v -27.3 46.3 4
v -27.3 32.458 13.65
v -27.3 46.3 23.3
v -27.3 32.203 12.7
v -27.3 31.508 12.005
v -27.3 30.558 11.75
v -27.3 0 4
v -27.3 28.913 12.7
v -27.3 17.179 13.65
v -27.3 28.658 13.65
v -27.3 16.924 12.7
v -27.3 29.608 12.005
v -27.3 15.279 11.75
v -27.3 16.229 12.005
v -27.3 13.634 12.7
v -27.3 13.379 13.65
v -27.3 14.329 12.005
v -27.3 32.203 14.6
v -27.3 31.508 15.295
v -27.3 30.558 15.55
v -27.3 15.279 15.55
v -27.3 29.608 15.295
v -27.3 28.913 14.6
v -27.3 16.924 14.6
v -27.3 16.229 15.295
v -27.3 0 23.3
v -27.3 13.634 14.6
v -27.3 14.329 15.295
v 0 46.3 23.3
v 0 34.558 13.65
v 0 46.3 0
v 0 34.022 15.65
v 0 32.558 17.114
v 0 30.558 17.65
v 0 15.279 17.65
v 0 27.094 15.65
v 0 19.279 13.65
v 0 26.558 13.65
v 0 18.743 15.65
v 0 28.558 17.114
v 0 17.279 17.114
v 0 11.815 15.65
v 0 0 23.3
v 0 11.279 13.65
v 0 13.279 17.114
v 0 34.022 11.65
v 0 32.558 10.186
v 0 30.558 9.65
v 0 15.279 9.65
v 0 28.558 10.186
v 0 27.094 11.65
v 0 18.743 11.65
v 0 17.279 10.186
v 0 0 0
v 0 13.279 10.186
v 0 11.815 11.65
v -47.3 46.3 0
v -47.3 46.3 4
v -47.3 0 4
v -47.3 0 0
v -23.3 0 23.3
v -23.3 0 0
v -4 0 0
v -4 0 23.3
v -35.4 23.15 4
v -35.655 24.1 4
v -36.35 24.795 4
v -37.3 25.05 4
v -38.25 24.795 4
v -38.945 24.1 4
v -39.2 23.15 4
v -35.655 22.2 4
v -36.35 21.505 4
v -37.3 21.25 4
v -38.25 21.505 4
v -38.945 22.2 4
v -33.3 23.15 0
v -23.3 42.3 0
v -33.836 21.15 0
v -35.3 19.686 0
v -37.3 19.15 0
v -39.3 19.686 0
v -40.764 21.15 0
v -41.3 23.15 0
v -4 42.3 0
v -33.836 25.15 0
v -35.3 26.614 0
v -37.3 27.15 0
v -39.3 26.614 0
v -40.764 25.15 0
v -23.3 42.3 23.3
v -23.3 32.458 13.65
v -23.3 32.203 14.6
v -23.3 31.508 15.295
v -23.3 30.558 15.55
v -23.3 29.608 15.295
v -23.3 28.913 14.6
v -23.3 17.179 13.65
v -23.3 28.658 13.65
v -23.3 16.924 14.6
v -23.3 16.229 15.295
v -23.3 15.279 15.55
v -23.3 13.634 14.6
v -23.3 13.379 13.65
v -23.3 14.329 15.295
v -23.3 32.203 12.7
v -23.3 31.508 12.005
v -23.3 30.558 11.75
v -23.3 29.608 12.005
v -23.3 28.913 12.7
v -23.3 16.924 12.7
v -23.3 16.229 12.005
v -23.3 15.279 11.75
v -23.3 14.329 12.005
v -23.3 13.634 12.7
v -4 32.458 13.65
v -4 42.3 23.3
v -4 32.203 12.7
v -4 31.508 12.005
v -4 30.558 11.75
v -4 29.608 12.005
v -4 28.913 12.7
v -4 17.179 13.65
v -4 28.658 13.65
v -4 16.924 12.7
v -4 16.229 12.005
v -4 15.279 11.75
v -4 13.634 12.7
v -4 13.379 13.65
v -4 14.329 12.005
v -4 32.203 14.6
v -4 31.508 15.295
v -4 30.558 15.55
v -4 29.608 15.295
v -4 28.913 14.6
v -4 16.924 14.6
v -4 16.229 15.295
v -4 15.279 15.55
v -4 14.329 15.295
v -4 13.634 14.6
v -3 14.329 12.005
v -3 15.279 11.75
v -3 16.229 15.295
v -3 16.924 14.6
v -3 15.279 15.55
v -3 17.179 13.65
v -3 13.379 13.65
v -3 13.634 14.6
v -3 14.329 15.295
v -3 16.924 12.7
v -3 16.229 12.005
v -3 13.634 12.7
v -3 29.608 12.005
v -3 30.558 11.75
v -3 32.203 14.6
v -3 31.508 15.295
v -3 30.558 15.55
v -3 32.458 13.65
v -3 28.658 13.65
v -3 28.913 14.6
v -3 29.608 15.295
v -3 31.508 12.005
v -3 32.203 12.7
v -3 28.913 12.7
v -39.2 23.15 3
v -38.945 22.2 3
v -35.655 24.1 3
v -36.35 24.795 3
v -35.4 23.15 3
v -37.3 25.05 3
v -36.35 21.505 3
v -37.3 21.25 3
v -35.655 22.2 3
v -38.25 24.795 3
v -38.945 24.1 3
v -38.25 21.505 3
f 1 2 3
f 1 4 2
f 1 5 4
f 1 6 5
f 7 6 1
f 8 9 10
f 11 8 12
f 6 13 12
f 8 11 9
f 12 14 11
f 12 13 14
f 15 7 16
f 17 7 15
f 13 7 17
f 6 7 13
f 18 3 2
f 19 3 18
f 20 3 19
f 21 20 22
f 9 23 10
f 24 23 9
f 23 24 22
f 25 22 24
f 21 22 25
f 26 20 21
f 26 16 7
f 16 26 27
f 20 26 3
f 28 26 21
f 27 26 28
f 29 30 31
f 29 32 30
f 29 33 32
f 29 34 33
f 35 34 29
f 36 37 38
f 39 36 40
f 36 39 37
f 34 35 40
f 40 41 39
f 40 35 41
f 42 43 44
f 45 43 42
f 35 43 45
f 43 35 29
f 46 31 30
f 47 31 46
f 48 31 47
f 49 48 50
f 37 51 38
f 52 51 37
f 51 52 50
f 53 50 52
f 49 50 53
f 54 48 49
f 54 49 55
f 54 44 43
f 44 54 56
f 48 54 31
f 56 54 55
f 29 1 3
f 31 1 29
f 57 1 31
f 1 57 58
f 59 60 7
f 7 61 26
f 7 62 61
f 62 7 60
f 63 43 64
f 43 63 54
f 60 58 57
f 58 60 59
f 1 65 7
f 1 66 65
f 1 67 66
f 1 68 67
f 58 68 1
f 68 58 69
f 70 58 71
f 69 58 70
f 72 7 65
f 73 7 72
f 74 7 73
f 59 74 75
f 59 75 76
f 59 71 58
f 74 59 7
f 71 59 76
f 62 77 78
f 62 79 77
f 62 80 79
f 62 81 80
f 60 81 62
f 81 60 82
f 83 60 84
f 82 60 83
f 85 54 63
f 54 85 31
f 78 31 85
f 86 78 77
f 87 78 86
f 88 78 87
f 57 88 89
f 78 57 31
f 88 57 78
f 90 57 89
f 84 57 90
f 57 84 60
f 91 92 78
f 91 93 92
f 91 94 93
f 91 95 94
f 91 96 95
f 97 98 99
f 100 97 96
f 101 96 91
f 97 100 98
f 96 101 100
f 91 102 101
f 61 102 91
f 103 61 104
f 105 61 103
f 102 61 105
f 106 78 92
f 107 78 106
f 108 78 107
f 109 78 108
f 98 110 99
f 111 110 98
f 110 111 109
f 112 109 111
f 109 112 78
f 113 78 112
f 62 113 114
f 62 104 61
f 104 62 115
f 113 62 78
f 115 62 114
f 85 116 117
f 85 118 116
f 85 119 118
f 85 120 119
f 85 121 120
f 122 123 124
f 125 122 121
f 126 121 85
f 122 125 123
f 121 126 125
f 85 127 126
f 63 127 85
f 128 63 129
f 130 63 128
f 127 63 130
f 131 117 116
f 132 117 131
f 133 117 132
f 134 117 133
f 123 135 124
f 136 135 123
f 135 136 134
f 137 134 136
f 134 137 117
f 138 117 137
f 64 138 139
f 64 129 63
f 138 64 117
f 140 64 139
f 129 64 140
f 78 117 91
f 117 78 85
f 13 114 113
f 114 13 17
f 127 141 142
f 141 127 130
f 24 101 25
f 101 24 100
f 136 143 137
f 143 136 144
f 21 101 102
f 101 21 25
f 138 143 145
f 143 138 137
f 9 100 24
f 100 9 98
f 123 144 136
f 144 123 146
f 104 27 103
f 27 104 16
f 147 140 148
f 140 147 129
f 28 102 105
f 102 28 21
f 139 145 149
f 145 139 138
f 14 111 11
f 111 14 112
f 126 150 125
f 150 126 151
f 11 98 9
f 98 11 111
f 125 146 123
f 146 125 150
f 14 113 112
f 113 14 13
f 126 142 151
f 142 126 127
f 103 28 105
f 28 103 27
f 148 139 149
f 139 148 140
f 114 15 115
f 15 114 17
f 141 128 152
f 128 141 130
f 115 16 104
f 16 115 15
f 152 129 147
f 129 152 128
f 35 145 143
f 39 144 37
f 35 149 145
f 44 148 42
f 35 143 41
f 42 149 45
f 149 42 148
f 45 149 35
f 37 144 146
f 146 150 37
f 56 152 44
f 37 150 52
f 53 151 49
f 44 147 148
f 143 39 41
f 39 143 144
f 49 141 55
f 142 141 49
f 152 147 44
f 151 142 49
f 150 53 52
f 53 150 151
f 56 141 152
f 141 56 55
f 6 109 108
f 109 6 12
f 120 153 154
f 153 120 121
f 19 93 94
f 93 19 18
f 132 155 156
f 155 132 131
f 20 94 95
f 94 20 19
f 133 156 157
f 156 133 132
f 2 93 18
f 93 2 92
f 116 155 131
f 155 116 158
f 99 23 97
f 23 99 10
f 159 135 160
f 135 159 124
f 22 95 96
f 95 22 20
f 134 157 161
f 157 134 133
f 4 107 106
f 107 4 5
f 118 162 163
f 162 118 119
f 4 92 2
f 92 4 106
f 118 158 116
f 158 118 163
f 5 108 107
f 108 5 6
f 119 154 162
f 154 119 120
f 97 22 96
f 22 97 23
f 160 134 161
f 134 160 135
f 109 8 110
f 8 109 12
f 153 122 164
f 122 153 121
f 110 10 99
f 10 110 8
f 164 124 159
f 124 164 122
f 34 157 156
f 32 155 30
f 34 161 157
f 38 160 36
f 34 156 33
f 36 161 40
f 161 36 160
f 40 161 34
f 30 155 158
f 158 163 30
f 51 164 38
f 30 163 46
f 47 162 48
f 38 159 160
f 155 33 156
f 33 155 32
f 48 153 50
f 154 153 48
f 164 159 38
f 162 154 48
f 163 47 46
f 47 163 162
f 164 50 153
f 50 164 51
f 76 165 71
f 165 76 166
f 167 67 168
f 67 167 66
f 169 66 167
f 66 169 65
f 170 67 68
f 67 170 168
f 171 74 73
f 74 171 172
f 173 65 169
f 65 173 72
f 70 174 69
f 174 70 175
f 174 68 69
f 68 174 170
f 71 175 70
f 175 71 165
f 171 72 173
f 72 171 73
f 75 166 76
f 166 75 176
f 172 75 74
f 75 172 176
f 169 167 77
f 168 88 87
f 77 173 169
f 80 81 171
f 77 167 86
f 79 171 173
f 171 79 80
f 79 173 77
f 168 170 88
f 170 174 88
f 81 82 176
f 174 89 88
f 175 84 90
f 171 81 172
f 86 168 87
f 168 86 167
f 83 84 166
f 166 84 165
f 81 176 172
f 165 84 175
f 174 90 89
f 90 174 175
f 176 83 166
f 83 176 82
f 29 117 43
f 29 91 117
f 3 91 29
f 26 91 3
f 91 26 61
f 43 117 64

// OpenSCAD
difference(){
	scale(v = [-1, 1, 1]) {
		union() {
			translate(v = [0, 0, 0]) {
				translate(v = [0, 0, -50]) {
					cube(size = [27.3000000000, 46.3000000000, 100]);
				}
			}
			translate(v = [27.3000000000, 0, 0]) {
				cube(size = [20, 46.3000000000, 4]);
			}
		}
	}
	/* Holes Below*/
	scale(v = [-1, 1, 1]){
		union(){
			translate(v = [0, 0, 0]){
				translate(v = [0, 0, -50]){
					translate(v = [4, -1, 0]) {
						cube(size = [19.3000000000, 43.3000000000, 100]);
					}
				}
				translate(v = [13.6500000000, 46.3000000000, -20]) {
					rotate(a = -90, v = [1, 0, 0]) {
						union() {
							union() {
								translate(v = [0, 0, -5]) {
									cylinder($fn = 12, h = 5, r = 1.9000000000);
								}
								translate(v = [0, 0, -3]) {
									cylinder($fn = 12, h = 3, r1 = 1.9000000000, r2 = 4);
								}
							}
							cylinder($fn = 12, h = 1, r = 4);
						}
					}
				}
			}
			translate(v = [0, 15.2790000000, 13.6500000000]) {
				rotate(a = -90, v = [0, 1, 0]) {
					union() {
						union() {
							translate(v = [0, 0, -28.3000000000]) {
								cylinder($fn = 12, h = 28.3000000000, r = 1.9000000000);
							}
							translate(v = [0, 0, -3]) {
								cylinder($fn = 12, h = 3, r1 = 1.9000000000, r2 = 4);
							}
						}
						cylinder($fn = 12, h = 1, r = 4);
					}
				}
			}
			translate(v = [0, 30.5580000000, 13.6500000000]) {
				rotate(a = -90, v = [0, 1, 0]) {
					union() {
						union() {
							translate(v = [0, 0, -28.3000000000]) {
								cylinder($fn = 12, h = 28.3000000000, r = 1.9000000000);
							}
							translate(v = [0, 0, -3]) {
								cylinder($fn = 12, h = 3, r1 = 1.9000000000, r2 = 4);
							}
						}
						cylinder($fn = 12, h = 1, r = 4);
					}
				}
			}
			translate(v = [37.3000000000, 23.1500000000, 0]) {
				rotate(a = 180, v = [0, 1, 0]) {
					union() {
						union() {
							translate(v = [0, 0, -5]) {
								cylinder($fn = 12, h = 5, r = 1.9000000000);
							}
							translate(v = [0, 0, -3]) {
								cylinder($fn = 12, h = 3, r1 = 1.9000000000, r2 = 4);
							}
						}
						cylinder($fn = 12, h = 1, r = 4);
					}
				}
			}
			translate(v = [-100, -100, -100]) {
				cube(size = [200, 200, 100]);
			}
			translate(v = [-100, -100, 23.3000000000]) {
				cube(size = [200, 200, 100]);
			}
		}
	} /* End Holes */ 
}
